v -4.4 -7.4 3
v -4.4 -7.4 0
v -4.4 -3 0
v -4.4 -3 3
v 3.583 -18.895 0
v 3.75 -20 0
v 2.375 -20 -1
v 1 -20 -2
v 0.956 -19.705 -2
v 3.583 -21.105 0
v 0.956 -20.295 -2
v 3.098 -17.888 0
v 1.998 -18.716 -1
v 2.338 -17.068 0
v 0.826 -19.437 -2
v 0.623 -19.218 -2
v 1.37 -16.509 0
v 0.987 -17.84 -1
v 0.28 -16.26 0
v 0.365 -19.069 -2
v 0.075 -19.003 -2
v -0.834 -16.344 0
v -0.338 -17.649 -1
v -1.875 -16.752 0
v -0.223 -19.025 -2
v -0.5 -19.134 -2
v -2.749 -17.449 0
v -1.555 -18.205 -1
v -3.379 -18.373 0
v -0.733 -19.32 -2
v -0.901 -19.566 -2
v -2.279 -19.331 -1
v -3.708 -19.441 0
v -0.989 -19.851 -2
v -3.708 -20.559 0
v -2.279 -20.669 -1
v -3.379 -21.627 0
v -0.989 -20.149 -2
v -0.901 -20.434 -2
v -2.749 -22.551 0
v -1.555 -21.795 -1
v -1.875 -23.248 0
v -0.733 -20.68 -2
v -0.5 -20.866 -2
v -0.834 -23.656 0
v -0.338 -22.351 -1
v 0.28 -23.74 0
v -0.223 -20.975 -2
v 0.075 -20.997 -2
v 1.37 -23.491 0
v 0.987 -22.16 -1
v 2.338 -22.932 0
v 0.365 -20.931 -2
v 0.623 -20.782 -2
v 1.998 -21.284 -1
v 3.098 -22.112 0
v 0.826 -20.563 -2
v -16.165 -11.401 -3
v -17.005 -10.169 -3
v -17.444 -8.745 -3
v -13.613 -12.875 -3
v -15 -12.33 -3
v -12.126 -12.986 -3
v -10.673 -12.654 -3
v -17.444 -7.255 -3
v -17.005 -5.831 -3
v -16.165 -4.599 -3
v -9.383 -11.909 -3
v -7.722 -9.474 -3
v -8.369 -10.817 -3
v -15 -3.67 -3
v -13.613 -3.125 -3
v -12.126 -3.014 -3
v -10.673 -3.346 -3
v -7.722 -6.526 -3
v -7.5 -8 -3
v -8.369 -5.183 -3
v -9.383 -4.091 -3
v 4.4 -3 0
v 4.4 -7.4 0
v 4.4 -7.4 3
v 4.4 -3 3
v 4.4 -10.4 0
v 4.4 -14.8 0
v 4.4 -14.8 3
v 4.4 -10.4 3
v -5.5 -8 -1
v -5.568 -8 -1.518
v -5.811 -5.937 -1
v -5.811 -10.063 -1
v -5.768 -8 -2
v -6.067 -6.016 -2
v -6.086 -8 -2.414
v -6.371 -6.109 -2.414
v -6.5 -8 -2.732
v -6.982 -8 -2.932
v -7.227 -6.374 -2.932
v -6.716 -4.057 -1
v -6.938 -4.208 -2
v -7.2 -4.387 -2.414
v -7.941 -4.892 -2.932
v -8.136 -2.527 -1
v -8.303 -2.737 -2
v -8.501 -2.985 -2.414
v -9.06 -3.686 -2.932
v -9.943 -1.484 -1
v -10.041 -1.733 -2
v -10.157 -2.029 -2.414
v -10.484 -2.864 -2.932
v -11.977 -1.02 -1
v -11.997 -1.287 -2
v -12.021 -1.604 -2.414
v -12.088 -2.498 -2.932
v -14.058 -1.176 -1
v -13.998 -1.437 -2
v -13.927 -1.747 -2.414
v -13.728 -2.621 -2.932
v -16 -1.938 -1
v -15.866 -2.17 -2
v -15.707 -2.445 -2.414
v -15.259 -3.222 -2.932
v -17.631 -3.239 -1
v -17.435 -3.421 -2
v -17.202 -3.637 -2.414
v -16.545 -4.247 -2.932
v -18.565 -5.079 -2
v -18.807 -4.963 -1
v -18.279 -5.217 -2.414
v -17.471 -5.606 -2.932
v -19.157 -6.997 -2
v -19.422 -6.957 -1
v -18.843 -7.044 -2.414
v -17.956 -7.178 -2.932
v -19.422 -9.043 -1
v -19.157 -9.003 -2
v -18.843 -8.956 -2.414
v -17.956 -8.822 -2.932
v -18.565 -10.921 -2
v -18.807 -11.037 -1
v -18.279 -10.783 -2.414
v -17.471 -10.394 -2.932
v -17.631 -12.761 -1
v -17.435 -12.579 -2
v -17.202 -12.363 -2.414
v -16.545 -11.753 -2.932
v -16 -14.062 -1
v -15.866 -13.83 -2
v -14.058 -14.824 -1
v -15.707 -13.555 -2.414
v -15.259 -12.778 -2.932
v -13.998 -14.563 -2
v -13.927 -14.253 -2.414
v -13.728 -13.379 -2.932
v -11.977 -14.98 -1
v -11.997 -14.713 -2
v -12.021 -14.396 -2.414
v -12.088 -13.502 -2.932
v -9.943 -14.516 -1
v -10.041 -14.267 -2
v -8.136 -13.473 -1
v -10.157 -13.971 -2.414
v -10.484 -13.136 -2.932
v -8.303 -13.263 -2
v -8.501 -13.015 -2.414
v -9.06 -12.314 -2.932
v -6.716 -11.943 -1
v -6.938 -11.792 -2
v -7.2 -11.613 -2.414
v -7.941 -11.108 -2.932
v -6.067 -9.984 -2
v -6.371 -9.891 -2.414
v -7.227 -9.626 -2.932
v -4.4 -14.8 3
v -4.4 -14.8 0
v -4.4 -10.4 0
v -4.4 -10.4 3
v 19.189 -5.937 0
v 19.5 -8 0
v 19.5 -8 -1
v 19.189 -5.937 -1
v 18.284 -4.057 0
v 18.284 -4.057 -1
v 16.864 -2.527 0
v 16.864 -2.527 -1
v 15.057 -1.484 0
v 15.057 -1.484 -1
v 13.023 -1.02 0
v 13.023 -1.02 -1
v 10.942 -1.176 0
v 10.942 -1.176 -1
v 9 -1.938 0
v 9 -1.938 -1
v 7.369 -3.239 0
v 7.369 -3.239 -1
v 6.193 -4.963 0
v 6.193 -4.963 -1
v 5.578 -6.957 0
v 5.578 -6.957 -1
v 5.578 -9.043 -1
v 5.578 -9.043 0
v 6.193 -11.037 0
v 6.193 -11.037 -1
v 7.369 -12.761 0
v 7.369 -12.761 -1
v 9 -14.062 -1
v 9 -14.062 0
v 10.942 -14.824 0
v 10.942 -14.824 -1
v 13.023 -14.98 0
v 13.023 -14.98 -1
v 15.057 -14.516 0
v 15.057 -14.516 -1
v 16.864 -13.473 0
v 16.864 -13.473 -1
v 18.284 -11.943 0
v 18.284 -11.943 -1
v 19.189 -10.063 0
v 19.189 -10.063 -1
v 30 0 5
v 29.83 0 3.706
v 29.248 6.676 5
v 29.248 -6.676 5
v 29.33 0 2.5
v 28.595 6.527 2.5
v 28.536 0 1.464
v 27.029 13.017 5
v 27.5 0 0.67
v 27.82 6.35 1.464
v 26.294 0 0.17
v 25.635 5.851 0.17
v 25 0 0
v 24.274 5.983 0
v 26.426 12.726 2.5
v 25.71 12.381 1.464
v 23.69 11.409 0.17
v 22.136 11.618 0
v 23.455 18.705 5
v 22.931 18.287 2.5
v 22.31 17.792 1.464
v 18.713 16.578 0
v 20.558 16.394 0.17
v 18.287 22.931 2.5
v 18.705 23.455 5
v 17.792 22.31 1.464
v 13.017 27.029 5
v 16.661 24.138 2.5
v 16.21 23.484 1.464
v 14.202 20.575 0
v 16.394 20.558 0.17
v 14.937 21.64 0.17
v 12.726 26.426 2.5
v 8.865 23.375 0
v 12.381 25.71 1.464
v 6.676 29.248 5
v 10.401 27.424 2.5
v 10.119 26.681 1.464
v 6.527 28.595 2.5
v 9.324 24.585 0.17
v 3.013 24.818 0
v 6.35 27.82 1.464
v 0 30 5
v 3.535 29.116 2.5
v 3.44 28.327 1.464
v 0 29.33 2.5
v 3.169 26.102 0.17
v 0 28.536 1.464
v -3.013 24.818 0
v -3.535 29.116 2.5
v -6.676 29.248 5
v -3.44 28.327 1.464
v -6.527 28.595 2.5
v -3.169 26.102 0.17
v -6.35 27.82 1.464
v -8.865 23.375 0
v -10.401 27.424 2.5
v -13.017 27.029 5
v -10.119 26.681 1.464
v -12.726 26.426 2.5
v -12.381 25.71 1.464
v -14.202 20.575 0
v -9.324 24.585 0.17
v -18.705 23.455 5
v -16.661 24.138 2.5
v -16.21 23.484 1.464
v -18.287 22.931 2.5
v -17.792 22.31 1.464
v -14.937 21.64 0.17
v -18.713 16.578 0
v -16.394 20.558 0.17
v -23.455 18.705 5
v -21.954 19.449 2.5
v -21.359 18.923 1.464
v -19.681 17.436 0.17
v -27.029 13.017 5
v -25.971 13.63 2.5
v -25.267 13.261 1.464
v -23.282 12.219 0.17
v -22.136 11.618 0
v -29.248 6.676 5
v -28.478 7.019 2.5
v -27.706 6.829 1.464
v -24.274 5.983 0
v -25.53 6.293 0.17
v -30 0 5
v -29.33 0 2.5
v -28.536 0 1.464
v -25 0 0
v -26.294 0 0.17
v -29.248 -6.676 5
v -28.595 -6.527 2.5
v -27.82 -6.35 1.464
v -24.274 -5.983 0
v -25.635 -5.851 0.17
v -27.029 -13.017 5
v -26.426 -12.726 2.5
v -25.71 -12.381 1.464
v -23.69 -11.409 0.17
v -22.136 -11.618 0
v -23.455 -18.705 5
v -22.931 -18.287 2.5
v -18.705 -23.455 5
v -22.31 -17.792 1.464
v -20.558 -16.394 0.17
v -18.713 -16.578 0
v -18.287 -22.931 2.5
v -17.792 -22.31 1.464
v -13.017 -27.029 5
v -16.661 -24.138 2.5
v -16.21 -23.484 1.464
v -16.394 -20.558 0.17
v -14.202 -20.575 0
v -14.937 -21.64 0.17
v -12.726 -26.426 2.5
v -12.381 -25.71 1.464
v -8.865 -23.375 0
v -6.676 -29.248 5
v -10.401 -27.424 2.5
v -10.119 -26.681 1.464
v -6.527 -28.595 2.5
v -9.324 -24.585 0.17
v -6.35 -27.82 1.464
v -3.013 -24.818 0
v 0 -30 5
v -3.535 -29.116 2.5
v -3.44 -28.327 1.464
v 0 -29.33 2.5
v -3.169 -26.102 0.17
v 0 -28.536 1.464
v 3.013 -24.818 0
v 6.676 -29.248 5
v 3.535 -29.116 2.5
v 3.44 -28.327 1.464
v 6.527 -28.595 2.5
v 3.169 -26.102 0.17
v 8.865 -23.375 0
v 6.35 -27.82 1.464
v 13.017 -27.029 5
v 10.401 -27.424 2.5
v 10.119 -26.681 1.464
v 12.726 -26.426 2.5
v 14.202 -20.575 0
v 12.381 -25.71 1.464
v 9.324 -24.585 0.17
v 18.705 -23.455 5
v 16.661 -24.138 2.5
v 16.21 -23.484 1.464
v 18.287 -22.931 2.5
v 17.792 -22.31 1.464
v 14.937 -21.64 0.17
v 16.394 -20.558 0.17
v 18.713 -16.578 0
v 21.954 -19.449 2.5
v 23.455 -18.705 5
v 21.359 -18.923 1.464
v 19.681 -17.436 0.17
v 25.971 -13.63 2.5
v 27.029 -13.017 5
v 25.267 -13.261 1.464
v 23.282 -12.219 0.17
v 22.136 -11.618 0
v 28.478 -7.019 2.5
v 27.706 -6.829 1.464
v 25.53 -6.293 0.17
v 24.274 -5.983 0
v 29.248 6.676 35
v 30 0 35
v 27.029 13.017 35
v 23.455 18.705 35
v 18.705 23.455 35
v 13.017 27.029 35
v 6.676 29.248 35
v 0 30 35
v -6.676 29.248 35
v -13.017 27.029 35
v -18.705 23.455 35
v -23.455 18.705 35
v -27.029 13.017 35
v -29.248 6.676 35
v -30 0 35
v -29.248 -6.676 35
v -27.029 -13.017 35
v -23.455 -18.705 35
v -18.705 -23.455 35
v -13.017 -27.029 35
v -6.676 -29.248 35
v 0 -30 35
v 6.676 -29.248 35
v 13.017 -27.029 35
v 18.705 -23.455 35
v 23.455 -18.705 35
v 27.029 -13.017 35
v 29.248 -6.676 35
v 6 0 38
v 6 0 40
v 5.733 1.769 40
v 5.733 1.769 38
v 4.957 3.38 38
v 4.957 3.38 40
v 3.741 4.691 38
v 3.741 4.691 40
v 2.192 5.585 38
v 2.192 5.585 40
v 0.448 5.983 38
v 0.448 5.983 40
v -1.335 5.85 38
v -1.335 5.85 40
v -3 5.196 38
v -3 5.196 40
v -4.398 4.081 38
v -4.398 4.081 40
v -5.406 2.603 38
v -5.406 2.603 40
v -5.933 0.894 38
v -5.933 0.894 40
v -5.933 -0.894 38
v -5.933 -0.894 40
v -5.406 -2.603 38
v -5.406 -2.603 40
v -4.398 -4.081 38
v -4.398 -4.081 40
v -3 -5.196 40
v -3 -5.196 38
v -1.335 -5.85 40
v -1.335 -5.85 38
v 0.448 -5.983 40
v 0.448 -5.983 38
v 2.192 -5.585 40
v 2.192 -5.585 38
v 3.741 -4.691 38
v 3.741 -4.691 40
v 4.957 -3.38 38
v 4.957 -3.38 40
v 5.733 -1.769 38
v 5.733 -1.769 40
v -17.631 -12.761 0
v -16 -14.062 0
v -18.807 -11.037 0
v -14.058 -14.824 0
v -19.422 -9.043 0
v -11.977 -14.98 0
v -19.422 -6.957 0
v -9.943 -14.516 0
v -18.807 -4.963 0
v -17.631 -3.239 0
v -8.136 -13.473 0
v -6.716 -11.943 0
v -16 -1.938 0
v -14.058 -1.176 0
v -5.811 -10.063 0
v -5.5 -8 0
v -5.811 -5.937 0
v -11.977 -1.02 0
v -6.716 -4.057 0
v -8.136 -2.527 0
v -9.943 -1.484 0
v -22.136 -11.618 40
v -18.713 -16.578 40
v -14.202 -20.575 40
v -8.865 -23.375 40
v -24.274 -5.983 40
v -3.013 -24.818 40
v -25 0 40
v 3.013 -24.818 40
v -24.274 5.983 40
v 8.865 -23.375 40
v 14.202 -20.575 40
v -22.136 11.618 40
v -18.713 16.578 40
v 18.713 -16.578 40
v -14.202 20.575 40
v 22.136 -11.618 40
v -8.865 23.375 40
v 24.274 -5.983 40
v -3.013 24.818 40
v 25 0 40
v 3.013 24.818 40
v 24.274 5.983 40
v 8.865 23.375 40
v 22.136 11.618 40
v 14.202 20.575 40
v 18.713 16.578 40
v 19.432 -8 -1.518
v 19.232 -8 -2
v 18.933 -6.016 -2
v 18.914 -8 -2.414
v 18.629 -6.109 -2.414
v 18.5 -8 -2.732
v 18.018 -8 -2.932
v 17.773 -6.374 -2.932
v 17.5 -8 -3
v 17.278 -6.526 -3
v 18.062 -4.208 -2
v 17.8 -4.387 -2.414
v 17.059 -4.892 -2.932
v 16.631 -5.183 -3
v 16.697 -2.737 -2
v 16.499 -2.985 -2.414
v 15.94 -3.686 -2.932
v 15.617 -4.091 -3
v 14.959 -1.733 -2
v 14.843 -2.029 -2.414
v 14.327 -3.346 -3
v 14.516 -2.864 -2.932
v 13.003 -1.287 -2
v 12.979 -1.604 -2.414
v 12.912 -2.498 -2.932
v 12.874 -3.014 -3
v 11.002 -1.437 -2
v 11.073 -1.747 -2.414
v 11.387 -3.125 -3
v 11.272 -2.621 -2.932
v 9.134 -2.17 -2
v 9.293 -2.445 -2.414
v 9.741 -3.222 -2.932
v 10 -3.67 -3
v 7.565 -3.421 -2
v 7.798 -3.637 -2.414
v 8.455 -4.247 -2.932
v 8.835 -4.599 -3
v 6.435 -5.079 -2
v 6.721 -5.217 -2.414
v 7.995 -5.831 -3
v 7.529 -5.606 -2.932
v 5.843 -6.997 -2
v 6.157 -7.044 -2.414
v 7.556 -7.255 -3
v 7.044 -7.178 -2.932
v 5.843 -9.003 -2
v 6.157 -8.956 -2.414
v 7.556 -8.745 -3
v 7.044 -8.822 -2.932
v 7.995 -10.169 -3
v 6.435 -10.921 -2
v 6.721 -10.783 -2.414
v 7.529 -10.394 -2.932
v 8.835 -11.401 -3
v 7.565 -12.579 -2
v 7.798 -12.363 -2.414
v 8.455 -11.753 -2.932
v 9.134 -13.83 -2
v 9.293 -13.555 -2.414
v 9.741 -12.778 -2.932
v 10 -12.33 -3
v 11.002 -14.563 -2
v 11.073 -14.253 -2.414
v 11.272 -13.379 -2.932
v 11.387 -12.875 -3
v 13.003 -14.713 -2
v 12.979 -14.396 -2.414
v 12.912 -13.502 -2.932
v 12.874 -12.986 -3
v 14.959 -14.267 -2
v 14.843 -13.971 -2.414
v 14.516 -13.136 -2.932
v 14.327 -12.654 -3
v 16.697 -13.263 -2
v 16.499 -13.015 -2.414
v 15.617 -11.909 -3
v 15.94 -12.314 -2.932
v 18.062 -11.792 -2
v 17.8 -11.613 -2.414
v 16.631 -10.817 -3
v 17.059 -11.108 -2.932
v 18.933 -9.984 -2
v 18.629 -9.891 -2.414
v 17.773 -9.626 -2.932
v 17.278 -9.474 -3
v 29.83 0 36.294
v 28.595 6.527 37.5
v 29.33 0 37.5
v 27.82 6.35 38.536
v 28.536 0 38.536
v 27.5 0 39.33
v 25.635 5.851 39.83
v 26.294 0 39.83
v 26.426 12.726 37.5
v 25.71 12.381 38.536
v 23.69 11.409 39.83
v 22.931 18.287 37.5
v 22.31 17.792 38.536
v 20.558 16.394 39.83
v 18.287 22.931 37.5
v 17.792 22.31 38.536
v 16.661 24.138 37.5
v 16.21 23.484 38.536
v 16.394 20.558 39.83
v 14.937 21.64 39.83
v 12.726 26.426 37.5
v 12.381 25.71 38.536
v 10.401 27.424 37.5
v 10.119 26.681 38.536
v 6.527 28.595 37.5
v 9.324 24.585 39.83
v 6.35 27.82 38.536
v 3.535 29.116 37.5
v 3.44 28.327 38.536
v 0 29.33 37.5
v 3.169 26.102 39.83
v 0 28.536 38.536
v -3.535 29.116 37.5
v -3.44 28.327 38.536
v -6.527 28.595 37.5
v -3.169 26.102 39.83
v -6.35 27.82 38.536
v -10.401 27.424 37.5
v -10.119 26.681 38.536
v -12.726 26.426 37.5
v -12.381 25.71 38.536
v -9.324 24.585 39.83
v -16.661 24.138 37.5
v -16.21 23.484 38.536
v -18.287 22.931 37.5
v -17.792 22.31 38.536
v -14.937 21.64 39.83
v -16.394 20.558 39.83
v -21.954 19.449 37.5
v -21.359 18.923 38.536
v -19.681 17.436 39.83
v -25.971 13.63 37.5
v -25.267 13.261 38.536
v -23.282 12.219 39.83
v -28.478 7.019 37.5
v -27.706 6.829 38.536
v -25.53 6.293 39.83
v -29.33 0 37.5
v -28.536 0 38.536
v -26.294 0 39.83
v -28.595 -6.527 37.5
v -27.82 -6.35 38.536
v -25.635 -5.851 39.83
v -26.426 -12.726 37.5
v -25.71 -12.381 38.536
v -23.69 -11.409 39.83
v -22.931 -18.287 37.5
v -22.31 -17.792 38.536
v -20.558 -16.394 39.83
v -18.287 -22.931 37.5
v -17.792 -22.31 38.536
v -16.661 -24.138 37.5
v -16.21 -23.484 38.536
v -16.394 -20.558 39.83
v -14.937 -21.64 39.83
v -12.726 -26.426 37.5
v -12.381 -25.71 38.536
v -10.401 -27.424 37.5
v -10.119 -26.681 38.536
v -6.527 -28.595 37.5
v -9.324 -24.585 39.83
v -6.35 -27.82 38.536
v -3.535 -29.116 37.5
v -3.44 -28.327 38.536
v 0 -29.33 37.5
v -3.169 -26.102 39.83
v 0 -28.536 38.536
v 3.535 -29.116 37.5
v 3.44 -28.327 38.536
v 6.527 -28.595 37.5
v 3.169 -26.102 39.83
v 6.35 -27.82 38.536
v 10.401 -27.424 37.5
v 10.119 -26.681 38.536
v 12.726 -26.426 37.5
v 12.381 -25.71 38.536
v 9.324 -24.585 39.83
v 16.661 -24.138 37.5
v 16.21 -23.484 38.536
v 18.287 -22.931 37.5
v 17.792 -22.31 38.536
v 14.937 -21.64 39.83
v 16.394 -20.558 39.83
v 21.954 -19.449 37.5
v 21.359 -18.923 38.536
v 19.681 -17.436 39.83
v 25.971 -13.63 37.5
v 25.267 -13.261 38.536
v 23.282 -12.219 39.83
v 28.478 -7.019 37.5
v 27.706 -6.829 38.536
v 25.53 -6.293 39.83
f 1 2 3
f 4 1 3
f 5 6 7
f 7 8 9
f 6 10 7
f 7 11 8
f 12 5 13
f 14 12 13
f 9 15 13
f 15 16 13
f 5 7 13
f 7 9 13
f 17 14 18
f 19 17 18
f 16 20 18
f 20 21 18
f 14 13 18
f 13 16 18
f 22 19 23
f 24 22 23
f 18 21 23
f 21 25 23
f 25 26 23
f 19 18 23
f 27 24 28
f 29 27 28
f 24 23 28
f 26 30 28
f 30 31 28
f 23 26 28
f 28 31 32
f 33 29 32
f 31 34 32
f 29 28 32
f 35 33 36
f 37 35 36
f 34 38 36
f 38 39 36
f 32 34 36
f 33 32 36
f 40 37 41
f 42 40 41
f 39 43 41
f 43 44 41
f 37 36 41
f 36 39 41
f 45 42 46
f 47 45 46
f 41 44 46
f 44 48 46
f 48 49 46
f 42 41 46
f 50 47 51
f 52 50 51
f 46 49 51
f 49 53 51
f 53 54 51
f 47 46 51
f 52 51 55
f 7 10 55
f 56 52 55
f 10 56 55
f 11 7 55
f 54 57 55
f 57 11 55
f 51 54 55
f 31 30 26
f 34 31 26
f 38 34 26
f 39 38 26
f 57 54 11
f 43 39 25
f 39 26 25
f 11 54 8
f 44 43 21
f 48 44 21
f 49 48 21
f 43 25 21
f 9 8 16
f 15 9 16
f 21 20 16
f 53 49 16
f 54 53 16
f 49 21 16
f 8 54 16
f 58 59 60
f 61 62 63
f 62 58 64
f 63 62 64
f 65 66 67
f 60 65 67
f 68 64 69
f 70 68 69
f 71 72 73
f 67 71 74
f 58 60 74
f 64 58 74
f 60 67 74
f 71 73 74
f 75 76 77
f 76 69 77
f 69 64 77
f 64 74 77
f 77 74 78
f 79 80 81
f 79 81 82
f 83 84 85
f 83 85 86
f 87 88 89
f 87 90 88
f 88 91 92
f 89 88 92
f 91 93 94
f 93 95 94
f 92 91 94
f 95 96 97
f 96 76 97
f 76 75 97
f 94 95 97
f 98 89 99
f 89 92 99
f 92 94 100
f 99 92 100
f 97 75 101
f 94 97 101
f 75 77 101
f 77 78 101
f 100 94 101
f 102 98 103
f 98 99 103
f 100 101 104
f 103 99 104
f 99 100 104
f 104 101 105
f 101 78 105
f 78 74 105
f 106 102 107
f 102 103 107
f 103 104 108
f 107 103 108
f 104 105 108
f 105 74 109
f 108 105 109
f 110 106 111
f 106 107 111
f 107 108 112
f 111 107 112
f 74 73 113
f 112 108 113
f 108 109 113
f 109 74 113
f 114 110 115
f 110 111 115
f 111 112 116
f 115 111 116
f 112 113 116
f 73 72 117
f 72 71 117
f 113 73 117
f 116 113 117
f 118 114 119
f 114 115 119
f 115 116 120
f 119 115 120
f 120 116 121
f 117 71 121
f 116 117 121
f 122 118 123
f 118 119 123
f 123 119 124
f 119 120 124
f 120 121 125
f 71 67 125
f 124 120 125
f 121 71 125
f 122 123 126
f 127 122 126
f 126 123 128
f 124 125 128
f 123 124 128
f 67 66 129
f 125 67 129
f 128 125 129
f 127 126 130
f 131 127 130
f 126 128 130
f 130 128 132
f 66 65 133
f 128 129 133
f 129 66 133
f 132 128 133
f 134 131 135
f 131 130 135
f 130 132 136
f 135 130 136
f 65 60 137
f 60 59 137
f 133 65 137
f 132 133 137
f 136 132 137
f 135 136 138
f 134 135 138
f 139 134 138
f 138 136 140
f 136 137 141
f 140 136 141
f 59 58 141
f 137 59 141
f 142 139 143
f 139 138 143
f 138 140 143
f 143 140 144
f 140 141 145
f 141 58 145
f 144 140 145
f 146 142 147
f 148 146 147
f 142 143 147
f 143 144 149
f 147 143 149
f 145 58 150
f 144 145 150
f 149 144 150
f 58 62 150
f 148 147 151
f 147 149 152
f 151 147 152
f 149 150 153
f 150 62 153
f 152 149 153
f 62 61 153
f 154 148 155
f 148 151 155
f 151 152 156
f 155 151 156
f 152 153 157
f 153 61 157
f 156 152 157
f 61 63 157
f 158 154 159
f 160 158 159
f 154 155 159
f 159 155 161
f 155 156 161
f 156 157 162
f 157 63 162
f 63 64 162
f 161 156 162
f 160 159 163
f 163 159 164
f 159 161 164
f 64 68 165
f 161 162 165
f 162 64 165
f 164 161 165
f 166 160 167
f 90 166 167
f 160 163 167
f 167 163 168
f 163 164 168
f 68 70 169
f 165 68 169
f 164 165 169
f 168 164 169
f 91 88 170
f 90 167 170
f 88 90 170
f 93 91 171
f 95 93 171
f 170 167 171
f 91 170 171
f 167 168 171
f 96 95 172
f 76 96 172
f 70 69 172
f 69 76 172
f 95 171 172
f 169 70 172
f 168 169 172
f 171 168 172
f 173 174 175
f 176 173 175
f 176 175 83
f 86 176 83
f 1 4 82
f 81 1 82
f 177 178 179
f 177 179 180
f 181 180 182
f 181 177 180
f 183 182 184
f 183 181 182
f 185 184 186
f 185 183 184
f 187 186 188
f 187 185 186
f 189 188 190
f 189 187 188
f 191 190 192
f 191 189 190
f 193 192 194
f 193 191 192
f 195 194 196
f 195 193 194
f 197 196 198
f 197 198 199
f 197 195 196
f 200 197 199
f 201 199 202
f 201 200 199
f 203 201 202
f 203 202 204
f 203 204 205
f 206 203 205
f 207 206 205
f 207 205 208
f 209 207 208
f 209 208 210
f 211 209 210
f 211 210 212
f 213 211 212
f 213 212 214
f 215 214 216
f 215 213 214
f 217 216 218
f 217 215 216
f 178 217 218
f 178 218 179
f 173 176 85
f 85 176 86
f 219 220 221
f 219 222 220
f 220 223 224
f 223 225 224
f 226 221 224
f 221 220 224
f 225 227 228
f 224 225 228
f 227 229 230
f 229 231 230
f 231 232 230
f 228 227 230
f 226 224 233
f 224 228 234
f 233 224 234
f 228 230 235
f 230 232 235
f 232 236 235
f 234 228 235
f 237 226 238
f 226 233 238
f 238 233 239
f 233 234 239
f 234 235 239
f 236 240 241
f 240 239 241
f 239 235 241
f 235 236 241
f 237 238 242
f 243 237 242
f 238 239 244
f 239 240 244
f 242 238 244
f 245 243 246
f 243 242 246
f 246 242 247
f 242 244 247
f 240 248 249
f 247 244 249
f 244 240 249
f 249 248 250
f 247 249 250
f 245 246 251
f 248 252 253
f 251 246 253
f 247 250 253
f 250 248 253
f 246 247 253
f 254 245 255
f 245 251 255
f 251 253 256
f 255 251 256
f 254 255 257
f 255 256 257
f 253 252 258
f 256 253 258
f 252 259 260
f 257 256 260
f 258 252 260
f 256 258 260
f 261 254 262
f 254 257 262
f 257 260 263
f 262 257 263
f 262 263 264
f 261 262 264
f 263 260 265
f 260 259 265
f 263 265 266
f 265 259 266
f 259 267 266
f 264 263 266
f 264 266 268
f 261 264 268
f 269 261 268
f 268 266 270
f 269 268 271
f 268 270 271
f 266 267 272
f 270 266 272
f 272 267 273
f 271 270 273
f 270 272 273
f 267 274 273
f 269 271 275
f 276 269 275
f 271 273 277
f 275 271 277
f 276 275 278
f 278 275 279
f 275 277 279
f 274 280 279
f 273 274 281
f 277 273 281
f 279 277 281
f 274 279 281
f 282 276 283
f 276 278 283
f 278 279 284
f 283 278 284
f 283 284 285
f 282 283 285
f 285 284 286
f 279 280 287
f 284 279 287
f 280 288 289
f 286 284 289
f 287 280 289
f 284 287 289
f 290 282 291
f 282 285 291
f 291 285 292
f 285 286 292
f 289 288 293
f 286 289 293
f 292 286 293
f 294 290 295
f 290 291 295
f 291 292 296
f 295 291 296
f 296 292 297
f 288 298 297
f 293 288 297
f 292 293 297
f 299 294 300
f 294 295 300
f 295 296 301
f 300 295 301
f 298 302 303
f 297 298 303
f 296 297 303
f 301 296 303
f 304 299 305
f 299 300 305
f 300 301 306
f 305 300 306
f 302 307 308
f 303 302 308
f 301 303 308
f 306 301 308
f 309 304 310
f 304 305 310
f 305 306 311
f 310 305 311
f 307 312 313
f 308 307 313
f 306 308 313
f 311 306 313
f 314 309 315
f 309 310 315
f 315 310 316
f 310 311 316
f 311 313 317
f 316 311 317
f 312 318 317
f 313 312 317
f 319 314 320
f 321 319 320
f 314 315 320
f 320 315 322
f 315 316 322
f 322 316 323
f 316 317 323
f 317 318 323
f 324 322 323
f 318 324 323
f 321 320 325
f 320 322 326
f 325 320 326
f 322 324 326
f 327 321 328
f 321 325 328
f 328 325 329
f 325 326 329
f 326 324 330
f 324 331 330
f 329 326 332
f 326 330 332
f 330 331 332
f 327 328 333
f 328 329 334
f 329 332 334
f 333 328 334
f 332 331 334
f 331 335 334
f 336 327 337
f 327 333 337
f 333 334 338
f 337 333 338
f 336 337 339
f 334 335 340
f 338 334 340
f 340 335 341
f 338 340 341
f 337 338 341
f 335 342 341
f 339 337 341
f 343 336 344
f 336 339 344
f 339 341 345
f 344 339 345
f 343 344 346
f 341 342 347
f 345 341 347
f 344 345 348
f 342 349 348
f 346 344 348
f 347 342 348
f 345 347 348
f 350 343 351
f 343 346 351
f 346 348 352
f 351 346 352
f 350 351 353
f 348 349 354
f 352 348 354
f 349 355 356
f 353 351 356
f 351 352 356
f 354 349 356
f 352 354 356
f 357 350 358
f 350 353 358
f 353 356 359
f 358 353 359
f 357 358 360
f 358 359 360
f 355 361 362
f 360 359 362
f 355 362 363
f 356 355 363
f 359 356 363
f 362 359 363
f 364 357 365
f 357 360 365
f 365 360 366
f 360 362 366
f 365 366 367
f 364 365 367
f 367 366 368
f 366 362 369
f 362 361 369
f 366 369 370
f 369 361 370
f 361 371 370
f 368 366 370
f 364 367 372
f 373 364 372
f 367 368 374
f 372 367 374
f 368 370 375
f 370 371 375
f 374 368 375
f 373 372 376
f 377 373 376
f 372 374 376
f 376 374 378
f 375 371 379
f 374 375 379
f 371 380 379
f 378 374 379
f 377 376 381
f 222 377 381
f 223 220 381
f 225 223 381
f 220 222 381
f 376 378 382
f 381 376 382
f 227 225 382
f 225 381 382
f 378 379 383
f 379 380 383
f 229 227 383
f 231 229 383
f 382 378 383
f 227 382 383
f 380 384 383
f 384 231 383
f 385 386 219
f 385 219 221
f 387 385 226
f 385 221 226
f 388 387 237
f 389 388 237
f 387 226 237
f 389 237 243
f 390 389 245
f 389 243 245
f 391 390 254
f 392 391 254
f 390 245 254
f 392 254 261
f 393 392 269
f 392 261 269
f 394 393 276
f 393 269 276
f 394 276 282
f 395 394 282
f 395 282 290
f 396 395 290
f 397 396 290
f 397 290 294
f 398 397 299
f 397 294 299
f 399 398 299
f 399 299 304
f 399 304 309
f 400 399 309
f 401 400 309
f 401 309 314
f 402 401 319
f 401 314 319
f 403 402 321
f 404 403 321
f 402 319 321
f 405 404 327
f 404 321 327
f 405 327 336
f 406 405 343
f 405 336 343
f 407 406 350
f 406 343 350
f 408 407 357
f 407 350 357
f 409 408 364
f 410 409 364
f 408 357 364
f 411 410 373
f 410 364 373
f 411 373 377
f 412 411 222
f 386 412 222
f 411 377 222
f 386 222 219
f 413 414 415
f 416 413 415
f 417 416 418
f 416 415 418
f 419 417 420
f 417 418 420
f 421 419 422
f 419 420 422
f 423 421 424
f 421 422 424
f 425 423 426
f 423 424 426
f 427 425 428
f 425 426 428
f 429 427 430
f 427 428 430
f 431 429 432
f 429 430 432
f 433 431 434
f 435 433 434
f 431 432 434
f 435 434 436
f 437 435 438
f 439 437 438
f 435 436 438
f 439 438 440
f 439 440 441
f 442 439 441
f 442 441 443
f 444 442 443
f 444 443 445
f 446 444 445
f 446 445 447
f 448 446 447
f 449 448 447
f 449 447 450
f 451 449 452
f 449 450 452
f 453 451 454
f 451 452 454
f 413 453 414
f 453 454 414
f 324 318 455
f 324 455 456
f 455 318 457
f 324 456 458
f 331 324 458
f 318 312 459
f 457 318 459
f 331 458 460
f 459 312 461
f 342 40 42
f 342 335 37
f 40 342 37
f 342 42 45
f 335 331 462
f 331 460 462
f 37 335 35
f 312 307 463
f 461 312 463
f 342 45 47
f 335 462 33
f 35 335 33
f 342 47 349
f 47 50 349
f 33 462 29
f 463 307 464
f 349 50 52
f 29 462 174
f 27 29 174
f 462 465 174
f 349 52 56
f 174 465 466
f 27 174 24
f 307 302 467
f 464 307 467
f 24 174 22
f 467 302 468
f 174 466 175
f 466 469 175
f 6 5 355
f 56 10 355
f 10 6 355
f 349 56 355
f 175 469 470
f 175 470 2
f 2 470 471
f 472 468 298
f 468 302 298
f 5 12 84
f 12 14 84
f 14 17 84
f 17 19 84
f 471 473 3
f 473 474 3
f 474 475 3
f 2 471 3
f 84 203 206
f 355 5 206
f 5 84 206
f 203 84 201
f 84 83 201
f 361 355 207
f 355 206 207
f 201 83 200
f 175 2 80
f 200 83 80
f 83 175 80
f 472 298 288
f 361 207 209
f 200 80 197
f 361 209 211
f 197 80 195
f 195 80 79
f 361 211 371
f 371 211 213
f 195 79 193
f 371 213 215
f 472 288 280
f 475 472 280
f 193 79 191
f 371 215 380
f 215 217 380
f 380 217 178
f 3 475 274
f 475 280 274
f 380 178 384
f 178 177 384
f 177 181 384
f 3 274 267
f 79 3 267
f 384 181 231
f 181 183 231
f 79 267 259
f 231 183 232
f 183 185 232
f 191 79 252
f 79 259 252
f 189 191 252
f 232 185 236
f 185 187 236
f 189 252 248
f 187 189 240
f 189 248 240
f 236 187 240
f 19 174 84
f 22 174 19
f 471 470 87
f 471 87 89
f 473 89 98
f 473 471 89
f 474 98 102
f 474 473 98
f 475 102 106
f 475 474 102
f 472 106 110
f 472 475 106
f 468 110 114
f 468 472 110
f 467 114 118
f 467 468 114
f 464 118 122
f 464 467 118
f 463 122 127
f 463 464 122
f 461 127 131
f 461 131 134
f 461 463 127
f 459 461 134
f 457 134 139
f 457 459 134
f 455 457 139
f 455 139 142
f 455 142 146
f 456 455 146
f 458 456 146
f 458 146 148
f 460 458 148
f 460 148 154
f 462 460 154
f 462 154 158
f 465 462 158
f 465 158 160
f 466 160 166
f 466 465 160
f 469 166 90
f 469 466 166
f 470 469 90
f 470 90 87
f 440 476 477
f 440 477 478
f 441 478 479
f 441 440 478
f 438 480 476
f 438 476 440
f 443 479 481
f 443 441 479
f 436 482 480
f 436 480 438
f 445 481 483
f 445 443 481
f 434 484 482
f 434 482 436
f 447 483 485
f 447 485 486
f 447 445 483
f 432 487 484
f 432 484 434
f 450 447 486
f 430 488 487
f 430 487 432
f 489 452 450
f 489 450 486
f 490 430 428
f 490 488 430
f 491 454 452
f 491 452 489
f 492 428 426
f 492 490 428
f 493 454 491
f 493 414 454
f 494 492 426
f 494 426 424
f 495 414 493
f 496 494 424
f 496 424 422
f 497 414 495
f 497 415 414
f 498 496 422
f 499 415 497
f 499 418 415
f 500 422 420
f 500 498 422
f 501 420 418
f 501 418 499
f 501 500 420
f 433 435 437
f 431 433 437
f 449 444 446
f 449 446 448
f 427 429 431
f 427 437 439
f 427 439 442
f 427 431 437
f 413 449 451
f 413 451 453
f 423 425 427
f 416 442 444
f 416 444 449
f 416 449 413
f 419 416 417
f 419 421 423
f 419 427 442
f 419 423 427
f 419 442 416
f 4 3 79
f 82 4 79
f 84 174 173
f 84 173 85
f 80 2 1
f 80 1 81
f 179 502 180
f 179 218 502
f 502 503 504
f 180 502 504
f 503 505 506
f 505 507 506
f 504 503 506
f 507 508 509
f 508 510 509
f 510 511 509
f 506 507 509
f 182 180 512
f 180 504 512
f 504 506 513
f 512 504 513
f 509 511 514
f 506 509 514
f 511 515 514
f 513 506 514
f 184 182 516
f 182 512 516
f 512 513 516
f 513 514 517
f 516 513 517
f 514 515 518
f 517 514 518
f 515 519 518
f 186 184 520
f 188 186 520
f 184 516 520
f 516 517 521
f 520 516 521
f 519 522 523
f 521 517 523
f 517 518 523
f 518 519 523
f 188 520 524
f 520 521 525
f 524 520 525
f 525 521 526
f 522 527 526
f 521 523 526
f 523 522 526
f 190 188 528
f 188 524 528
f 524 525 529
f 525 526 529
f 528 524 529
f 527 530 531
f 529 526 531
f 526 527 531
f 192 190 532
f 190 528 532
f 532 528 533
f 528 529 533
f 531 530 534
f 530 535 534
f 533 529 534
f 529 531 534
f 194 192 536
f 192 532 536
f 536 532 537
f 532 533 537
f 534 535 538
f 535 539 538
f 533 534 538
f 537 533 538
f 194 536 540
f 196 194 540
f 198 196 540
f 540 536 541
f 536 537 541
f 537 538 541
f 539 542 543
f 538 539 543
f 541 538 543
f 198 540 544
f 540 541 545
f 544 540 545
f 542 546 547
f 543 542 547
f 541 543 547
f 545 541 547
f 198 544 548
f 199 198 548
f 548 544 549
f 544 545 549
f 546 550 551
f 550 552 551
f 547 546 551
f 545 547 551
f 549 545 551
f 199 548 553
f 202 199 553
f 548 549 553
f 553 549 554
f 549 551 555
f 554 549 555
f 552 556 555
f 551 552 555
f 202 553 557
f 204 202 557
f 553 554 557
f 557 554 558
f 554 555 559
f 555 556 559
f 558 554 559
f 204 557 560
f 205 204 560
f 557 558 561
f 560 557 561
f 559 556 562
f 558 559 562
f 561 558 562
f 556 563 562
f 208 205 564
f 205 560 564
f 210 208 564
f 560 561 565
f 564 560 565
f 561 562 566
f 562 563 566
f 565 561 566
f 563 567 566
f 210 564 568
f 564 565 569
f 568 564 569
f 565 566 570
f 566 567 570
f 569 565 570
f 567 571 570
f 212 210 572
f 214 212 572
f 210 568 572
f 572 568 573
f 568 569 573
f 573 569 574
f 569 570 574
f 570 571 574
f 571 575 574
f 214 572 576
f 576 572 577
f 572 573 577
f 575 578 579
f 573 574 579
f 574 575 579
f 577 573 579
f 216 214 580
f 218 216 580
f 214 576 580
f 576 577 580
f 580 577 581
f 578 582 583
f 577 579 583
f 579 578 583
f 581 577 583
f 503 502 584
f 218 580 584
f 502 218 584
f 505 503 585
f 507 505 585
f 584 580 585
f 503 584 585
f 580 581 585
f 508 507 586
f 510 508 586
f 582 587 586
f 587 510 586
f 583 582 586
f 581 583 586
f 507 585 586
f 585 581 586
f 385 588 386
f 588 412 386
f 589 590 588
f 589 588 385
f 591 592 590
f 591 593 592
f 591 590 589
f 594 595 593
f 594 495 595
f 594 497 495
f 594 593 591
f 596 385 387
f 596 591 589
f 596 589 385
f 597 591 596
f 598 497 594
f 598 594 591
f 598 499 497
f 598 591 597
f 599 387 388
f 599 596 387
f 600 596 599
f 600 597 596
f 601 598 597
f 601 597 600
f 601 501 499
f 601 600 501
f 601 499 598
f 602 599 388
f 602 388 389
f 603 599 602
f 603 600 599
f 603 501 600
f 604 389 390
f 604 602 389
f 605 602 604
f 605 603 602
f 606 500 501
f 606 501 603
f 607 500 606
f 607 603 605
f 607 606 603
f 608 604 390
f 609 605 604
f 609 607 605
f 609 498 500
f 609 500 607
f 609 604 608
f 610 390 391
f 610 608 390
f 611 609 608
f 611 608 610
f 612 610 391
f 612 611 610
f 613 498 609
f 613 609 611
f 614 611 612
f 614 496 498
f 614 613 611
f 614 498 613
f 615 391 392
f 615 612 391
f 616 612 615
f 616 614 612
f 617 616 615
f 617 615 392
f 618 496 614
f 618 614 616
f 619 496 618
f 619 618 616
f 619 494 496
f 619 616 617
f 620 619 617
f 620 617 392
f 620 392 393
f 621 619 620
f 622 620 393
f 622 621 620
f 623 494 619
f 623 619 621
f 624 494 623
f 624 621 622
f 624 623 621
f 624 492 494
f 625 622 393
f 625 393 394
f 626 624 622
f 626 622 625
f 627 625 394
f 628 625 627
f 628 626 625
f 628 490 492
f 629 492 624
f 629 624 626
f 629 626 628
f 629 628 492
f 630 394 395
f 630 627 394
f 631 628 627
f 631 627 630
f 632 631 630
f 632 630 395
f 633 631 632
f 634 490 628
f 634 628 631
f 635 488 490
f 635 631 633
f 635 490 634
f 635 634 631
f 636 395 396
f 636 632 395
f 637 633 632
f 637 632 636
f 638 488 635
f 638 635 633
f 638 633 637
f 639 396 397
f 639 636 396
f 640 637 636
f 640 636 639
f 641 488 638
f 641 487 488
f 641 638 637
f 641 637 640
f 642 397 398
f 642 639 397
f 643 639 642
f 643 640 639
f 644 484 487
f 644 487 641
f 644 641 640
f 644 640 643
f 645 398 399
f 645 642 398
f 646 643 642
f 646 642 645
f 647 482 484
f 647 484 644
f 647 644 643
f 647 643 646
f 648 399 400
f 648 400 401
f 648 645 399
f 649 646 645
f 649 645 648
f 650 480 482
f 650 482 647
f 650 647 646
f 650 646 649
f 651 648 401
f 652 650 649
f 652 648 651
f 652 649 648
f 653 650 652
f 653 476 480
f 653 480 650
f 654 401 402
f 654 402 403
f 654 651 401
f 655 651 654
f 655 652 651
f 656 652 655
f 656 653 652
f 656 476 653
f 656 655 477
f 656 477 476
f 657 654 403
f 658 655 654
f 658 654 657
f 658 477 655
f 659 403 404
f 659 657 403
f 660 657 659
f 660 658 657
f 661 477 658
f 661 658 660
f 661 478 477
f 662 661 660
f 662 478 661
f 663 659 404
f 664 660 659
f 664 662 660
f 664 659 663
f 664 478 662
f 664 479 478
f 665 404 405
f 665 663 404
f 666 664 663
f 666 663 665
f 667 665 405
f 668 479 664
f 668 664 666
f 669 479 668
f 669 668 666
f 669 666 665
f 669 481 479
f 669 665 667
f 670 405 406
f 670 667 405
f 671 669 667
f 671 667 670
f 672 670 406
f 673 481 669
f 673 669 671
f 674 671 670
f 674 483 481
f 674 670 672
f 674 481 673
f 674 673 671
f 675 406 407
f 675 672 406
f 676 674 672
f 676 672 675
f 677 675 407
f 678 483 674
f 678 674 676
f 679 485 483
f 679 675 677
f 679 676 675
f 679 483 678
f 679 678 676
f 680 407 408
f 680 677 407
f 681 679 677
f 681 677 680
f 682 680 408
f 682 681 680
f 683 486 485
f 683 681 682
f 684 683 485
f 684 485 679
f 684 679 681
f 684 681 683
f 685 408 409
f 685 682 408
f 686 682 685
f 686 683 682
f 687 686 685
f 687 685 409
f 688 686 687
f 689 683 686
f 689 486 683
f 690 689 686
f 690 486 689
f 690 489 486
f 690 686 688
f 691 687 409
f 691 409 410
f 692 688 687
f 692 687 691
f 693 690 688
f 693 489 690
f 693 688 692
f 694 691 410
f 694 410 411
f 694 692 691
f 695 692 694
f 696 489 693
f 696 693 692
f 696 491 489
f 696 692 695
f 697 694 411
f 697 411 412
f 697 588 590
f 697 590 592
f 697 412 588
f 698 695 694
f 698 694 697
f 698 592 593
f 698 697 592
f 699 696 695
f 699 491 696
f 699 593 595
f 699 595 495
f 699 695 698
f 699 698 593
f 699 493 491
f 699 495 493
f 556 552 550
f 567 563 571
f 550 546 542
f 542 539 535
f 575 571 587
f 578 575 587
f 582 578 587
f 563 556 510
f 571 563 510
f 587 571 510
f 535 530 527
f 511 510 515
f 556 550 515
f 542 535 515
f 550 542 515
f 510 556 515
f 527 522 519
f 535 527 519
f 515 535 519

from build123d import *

# Parameters (mm, degrees)
SKETCH005_R      = 6
EXTRUDE003_DEPTH = 2
SKETCH001_R      = 7
EXTRUDE001_DEPTH = 3
SKETCH003_R      = 3.75
SKETCH004_R      = 1
SKETCH002_W      = 8.8
SKETCH002_H      = 4.4
EXTRUDE002_DEPTH = 3
SKETCH_R         = 30
EXTRUDE_DEPTH    = 40
FILLET_R         = 5
FILLET001_R      = 5
FILLET002_R      = 2


with BuildPart() as extrude003:
    # Sketch005 → Extrude003 (new body)
    with BuildSketch(Plane.XY.offset(40)):
        Circle(SKETCH005_R)
    extrude(amount=-EXTRUDE003_DEPTH)


with BuildPart() as bigbuttons:
    # Sketch001 → Extrude001 (new body)
    with BuildSketch(Plane.XY):
        with Locations((12.5, -8)):
            Circle(SKETCH001_R)
        with Locations((-12.5, -8)):
            Circle(SKETCH001_R)
    extrude(amount=-EXTRUDE001_DEPTH)


with BuildPart() as loft_body:
    # Sketch003 → Loft section 0
    with BuildSketch(Plane.XY):
        with Locations((0, -20)):
            Circle(SKETCH003_R)
    # Sketch004 → Loft section 1
    with BuildSketch(Plane.XY.offset(-2)):
        with Locations((0, -20)):
            Circle(SKETCH004_R)
    loft()


with BuildPart() as port_cuts001:
    # Sketch002 → Extrude002 (new body)
    with BuildSketch(Plane.XY):
        with Locations((0, -5.2)):
            Rectangle(SKETCH002_W, SKETCH002_H)
        with Locations((0, -12.6)):
            Rectangle(SKETCH002_W, SKETCH002_H)
    extrude(amount=EXTRUDE002_DEPTH)


with BuildPart() as cut001:
    # Sketch → Extrude (new body)
    with BuildSketch(Plane.XY):
        Circle(SKETCH_R)
    extrude(amount=EXTRUDE_DEPTH)

    # Cut: cut Port Cuts001
    add(port_cuts001.part, mode=Mode.SUBTRACT)

    # Fusion: union Loft body
    add(loft_body.part)

    # Fusion001: union BigButtons
    add(bigbuttons.part)

    # Fillet
    fillet_edges = [cut001.edges().sort_by_distance(p)[0] for p in [
        (-30, 0, 40),
    ]]
    fillet(fillet_edges, radius=FILLET_R)

    # Fillet001
    fillet001_edges = [cut001.edges().sort_by_distance(p)[0] for p in [
        (-30, 0, 0),
    ]]
    fillet(fillet001_edges, radius=FILLET001_R)

    # Fillet002
    fillet002_edges = [cut001.edges().sort_by_distance(p)[0] for p in [
        (-19.5, -8, -3),
        (5.5, -8, -3),
    ]]
    fillet(fillet002_edges, radius=FILLET002_R)

    # Cut001: cut Extrude003
    add(extrude003.part, mode=Mode.SUBTRACT)


solid = cut001.part
